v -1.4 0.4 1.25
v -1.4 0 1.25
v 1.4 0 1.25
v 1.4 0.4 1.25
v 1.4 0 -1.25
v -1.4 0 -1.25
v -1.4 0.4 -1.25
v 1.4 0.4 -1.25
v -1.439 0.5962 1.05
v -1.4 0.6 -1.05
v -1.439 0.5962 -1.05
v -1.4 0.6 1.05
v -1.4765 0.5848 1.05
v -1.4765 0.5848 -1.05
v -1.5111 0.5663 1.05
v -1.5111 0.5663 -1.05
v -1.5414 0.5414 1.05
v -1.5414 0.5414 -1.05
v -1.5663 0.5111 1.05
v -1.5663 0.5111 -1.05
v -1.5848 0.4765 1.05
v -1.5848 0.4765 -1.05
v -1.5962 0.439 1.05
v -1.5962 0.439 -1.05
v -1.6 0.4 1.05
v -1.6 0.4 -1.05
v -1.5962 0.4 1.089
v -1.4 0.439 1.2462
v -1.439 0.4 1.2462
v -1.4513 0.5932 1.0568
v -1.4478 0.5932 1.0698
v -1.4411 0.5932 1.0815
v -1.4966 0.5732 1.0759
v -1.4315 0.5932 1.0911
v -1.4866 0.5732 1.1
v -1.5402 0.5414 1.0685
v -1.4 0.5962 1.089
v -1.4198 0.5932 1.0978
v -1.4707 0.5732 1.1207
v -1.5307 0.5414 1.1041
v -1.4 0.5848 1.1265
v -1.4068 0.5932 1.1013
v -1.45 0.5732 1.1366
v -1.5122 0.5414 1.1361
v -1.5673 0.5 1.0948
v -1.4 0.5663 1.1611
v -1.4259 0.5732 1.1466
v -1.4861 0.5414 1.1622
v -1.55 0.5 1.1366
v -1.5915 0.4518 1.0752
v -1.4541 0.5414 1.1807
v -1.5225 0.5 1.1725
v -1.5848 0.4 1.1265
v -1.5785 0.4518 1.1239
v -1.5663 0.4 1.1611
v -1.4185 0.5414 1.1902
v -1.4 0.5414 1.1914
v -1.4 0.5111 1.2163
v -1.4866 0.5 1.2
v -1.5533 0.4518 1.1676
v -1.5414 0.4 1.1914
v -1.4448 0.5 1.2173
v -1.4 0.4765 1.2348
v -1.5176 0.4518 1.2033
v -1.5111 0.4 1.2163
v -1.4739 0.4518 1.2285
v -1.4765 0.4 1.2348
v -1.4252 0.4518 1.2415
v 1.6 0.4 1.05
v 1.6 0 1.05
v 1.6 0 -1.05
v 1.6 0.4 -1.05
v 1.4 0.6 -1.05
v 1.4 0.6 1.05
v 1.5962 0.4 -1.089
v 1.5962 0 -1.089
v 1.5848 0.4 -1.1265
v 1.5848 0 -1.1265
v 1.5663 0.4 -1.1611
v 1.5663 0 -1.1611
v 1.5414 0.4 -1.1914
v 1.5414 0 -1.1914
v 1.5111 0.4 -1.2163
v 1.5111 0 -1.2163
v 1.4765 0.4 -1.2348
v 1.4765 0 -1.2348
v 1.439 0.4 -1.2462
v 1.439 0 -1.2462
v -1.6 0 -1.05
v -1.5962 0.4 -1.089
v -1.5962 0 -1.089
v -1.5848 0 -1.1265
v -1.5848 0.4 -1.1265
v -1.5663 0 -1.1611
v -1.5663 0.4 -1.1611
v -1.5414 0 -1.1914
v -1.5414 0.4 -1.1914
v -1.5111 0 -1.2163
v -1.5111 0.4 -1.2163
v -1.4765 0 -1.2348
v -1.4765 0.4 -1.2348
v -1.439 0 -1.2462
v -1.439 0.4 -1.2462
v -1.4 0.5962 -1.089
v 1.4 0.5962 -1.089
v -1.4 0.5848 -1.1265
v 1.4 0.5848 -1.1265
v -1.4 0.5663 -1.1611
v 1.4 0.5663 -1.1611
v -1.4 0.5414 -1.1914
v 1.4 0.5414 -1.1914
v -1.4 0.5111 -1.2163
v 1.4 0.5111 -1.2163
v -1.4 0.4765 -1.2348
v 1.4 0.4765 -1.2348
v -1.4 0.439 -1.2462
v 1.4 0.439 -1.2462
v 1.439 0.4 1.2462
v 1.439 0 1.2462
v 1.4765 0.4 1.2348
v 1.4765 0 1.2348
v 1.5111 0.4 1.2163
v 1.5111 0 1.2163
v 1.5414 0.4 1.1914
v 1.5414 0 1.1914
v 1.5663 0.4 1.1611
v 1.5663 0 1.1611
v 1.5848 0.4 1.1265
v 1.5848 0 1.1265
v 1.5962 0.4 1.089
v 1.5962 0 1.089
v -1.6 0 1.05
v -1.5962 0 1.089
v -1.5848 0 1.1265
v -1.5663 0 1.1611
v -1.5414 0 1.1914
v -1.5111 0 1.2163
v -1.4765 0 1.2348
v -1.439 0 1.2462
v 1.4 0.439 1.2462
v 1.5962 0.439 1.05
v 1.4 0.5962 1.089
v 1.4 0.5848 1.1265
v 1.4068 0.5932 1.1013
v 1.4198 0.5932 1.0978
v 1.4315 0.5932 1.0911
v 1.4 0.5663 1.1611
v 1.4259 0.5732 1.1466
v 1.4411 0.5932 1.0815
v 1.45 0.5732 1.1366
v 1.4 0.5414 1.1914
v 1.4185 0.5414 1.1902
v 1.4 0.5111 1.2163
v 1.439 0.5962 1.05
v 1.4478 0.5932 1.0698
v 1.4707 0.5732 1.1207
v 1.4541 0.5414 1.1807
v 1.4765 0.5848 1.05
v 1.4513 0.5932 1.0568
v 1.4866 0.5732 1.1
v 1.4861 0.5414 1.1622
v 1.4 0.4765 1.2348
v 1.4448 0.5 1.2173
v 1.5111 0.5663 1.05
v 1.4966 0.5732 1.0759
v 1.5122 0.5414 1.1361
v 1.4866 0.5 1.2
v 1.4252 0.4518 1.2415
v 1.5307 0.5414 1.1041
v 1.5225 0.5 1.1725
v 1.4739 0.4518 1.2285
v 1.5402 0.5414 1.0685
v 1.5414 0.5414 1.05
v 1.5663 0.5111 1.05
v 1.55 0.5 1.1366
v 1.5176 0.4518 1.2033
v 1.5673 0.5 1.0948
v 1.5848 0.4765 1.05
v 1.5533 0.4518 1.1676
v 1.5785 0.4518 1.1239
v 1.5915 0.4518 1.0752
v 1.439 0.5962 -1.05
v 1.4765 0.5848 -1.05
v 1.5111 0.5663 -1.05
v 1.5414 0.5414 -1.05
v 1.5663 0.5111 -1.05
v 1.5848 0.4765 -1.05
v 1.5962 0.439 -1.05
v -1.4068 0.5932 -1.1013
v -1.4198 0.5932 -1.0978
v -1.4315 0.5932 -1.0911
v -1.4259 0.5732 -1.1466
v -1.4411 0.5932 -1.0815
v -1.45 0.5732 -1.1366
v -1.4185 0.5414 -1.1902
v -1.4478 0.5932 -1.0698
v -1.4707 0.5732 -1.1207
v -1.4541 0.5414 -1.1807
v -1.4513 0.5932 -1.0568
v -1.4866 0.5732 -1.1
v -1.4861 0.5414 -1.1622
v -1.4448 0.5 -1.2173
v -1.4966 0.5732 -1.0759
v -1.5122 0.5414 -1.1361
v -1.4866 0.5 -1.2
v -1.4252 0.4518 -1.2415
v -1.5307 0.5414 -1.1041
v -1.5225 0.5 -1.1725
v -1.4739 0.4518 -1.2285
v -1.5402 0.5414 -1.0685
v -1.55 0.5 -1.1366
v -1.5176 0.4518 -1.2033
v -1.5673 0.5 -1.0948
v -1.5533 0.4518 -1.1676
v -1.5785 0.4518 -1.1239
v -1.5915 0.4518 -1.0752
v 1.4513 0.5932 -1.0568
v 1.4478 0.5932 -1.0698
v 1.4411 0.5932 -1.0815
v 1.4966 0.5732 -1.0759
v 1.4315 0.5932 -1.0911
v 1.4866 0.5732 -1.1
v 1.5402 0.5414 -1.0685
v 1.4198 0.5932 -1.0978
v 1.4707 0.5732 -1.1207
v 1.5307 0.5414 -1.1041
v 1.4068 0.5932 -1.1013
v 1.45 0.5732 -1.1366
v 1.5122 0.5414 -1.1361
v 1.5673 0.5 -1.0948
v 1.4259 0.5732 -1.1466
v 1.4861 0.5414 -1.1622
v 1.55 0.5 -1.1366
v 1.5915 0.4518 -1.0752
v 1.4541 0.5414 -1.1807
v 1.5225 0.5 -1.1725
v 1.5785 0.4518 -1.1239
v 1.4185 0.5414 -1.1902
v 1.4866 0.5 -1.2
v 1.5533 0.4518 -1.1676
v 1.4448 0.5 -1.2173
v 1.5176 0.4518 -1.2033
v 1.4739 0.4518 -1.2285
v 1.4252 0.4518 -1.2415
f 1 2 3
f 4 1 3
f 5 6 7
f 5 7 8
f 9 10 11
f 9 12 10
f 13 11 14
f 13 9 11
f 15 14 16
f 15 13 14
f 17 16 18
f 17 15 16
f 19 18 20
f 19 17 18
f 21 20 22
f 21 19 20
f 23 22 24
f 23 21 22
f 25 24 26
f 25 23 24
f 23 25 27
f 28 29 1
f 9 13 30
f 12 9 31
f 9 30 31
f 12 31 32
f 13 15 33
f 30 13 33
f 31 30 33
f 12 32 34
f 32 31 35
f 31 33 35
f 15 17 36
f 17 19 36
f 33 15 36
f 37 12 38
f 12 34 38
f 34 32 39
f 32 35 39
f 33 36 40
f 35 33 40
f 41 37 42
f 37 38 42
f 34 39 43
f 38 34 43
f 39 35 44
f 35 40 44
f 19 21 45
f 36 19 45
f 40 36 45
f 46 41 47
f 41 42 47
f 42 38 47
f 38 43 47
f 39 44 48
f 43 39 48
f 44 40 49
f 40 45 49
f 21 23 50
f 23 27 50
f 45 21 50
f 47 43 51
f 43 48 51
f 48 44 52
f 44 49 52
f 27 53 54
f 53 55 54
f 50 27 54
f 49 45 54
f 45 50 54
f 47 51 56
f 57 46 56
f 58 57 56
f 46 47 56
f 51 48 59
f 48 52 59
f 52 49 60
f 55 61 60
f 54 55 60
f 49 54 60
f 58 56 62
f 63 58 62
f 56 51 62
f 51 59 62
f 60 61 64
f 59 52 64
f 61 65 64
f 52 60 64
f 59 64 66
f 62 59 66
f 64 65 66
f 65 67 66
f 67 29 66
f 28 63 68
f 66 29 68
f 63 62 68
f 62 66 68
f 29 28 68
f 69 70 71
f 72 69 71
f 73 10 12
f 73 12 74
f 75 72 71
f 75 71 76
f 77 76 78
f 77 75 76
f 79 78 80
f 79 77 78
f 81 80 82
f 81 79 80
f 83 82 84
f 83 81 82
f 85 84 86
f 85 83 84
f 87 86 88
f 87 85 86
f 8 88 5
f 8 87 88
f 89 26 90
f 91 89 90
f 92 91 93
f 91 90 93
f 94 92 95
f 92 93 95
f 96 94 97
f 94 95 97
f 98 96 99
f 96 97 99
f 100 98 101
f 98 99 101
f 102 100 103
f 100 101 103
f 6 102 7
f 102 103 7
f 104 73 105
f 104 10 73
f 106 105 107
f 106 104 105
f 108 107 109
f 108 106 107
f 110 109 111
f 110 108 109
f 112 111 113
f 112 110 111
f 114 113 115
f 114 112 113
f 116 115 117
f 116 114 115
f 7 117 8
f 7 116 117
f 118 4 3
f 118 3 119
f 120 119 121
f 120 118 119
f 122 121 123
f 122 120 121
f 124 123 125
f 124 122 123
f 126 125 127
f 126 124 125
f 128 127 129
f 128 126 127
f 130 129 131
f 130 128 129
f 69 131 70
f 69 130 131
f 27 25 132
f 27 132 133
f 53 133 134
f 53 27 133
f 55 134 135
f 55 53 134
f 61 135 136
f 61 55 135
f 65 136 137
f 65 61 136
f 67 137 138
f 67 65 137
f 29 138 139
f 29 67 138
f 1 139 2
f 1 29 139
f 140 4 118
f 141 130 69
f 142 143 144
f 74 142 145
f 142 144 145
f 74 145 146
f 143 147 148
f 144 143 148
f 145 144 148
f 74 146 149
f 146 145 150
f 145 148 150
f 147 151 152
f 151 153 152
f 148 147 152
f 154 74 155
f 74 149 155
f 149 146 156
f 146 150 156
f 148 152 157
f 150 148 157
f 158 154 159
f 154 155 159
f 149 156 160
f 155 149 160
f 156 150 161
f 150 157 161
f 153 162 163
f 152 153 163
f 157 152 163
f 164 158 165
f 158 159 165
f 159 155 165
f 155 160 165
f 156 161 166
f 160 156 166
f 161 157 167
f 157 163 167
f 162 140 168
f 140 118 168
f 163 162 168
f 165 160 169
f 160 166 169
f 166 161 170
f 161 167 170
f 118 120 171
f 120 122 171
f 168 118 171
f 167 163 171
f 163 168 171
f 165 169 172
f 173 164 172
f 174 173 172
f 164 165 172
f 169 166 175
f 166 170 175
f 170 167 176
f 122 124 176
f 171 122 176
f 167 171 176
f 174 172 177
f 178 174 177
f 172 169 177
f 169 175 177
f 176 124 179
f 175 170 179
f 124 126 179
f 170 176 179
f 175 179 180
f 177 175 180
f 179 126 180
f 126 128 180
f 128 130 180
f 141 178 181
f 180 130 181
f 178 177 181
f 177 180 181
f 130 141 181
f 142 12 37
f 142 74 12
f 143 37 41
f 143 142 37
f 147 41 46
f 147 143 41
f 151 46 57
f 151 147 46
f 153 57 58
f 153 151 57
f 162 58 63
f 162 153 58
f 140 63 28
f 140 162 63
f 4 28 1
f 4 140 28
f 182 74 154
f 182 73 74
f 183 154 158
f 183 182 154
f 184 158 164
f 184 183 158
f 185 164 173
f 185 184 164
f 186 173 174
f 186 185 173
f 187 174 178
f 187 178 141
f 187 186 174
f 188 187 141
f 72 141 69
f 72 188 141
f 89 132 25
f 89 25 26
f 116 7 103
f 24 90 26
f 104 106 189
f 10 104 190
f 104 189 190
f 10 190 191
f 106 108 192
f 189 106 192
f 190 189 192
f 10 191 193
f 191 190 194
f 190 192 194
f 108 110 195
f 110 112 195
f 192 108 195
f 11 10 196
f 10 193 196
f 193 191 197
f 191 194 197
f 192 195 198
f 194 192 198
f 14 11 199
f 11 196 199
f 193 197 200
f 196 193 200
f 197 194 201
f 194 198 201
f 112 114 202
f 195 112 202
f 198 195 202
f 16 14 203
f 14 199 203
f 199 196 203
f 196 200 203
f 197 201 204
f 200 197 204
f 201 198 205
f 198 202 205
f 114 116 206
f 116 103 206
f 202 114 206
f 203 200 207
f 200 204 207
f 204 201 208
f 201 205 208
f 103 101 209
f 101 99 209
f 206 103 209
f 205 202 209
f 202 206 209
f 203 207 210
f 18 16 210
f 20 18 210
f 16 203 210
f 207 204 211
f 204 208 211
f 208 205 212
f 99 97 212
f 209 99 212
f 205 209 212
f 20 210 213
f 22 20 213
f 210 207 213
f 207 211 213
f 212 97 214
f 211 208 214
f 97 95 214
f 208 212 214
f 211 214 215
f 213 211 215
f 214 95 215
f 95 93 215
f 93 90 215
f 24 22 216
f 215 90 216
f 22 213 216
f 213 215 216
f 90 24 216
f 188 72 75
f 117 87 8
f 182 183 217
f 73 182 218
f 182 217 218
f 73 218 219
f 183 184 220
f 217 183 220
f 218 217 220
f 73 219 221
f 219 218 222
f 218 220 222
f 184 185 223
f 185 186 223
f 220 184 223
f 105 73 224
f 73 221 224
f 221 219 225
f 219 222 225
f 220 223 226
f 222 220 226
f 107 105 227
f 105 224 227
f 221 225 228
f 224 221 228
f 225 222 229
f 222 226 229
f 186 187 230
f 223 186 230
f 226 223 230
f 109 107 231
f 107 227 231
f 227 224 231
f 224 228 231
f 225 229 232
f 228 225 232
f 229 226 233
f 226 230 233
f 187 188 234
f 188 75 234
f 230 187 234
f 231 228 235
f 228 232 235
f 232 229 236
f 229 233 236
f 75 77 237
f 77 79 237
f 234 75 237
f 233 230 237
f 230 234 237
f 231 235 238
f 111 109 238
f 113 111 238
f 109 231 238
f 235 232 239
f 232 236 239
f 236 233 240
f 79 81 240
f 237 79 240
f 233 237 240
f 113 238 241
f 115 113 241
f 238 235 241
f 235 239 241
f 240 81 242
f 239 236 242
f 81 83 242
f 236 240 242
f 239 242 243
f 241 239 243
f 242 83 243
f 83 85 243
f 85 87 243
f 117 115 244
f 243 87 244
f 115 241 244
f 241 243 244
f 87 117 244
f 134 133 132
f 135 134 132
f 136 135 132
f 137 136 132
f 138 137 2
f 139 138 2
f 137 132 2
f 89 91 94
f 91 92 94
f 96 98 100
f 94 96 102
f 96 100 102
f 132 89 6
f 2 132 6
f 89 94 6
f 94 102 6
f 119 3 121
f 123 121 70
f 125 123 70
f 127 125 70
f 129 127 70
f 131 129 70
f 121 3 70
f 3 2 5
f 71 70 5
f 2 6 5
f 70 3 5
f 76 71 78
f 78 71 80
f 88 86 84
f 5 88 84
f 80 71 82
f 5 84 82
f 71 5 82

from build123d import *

# Parameters (mm, degrees)
BASES_W    = 3.2
BASES_H    = 2.5
BASE_DEPTH = 0.6
SIDEF_R    = 0.2
TOPF_R     = 0.2


with BuildPart() as part:
    # BaseS → Base (new body)
    with BuildSketch(Plane(origin=(0, 0, 0), x_dir=(1, 0, 0), z_dir=(0, 1, 0))):
        Rectangle(BASES_W, BASES_H)
    extrude(amount=BASE_DEPTH)

    # SideF
    sidef_edges = [part.edges().sort_by_distance(p)[0] for p in [
        (1.6, 0.3, 1.25),
        (-1.6, 0.3, 1.25),
        (-1.6, 0.3, -1.25),
        (1.6, 0.3, -1.25),
    ]]
    fillet(sidef_edges, radius=SIDEF_R)

    # TopF
    topf_edges = [part.edges().sort_by_distance(p)[0] for p in [
        (1.6, 0.6, 0),
        (0, 0.6, 1.25),
        (0, 0.6, -1.25),
        (-1.6, 0.6, 0),
        (-1.541421356, 0.6, -1.191421356),
        (-1.541421356, 0.6, 1.191421356),
        (1.541421356, 0.6, -1.191421356),
        (1.541421356, 0.6, 1.191421356),
    ]]
    fillet(topf_edges, radius=TOPF_R)


solid = part.part
